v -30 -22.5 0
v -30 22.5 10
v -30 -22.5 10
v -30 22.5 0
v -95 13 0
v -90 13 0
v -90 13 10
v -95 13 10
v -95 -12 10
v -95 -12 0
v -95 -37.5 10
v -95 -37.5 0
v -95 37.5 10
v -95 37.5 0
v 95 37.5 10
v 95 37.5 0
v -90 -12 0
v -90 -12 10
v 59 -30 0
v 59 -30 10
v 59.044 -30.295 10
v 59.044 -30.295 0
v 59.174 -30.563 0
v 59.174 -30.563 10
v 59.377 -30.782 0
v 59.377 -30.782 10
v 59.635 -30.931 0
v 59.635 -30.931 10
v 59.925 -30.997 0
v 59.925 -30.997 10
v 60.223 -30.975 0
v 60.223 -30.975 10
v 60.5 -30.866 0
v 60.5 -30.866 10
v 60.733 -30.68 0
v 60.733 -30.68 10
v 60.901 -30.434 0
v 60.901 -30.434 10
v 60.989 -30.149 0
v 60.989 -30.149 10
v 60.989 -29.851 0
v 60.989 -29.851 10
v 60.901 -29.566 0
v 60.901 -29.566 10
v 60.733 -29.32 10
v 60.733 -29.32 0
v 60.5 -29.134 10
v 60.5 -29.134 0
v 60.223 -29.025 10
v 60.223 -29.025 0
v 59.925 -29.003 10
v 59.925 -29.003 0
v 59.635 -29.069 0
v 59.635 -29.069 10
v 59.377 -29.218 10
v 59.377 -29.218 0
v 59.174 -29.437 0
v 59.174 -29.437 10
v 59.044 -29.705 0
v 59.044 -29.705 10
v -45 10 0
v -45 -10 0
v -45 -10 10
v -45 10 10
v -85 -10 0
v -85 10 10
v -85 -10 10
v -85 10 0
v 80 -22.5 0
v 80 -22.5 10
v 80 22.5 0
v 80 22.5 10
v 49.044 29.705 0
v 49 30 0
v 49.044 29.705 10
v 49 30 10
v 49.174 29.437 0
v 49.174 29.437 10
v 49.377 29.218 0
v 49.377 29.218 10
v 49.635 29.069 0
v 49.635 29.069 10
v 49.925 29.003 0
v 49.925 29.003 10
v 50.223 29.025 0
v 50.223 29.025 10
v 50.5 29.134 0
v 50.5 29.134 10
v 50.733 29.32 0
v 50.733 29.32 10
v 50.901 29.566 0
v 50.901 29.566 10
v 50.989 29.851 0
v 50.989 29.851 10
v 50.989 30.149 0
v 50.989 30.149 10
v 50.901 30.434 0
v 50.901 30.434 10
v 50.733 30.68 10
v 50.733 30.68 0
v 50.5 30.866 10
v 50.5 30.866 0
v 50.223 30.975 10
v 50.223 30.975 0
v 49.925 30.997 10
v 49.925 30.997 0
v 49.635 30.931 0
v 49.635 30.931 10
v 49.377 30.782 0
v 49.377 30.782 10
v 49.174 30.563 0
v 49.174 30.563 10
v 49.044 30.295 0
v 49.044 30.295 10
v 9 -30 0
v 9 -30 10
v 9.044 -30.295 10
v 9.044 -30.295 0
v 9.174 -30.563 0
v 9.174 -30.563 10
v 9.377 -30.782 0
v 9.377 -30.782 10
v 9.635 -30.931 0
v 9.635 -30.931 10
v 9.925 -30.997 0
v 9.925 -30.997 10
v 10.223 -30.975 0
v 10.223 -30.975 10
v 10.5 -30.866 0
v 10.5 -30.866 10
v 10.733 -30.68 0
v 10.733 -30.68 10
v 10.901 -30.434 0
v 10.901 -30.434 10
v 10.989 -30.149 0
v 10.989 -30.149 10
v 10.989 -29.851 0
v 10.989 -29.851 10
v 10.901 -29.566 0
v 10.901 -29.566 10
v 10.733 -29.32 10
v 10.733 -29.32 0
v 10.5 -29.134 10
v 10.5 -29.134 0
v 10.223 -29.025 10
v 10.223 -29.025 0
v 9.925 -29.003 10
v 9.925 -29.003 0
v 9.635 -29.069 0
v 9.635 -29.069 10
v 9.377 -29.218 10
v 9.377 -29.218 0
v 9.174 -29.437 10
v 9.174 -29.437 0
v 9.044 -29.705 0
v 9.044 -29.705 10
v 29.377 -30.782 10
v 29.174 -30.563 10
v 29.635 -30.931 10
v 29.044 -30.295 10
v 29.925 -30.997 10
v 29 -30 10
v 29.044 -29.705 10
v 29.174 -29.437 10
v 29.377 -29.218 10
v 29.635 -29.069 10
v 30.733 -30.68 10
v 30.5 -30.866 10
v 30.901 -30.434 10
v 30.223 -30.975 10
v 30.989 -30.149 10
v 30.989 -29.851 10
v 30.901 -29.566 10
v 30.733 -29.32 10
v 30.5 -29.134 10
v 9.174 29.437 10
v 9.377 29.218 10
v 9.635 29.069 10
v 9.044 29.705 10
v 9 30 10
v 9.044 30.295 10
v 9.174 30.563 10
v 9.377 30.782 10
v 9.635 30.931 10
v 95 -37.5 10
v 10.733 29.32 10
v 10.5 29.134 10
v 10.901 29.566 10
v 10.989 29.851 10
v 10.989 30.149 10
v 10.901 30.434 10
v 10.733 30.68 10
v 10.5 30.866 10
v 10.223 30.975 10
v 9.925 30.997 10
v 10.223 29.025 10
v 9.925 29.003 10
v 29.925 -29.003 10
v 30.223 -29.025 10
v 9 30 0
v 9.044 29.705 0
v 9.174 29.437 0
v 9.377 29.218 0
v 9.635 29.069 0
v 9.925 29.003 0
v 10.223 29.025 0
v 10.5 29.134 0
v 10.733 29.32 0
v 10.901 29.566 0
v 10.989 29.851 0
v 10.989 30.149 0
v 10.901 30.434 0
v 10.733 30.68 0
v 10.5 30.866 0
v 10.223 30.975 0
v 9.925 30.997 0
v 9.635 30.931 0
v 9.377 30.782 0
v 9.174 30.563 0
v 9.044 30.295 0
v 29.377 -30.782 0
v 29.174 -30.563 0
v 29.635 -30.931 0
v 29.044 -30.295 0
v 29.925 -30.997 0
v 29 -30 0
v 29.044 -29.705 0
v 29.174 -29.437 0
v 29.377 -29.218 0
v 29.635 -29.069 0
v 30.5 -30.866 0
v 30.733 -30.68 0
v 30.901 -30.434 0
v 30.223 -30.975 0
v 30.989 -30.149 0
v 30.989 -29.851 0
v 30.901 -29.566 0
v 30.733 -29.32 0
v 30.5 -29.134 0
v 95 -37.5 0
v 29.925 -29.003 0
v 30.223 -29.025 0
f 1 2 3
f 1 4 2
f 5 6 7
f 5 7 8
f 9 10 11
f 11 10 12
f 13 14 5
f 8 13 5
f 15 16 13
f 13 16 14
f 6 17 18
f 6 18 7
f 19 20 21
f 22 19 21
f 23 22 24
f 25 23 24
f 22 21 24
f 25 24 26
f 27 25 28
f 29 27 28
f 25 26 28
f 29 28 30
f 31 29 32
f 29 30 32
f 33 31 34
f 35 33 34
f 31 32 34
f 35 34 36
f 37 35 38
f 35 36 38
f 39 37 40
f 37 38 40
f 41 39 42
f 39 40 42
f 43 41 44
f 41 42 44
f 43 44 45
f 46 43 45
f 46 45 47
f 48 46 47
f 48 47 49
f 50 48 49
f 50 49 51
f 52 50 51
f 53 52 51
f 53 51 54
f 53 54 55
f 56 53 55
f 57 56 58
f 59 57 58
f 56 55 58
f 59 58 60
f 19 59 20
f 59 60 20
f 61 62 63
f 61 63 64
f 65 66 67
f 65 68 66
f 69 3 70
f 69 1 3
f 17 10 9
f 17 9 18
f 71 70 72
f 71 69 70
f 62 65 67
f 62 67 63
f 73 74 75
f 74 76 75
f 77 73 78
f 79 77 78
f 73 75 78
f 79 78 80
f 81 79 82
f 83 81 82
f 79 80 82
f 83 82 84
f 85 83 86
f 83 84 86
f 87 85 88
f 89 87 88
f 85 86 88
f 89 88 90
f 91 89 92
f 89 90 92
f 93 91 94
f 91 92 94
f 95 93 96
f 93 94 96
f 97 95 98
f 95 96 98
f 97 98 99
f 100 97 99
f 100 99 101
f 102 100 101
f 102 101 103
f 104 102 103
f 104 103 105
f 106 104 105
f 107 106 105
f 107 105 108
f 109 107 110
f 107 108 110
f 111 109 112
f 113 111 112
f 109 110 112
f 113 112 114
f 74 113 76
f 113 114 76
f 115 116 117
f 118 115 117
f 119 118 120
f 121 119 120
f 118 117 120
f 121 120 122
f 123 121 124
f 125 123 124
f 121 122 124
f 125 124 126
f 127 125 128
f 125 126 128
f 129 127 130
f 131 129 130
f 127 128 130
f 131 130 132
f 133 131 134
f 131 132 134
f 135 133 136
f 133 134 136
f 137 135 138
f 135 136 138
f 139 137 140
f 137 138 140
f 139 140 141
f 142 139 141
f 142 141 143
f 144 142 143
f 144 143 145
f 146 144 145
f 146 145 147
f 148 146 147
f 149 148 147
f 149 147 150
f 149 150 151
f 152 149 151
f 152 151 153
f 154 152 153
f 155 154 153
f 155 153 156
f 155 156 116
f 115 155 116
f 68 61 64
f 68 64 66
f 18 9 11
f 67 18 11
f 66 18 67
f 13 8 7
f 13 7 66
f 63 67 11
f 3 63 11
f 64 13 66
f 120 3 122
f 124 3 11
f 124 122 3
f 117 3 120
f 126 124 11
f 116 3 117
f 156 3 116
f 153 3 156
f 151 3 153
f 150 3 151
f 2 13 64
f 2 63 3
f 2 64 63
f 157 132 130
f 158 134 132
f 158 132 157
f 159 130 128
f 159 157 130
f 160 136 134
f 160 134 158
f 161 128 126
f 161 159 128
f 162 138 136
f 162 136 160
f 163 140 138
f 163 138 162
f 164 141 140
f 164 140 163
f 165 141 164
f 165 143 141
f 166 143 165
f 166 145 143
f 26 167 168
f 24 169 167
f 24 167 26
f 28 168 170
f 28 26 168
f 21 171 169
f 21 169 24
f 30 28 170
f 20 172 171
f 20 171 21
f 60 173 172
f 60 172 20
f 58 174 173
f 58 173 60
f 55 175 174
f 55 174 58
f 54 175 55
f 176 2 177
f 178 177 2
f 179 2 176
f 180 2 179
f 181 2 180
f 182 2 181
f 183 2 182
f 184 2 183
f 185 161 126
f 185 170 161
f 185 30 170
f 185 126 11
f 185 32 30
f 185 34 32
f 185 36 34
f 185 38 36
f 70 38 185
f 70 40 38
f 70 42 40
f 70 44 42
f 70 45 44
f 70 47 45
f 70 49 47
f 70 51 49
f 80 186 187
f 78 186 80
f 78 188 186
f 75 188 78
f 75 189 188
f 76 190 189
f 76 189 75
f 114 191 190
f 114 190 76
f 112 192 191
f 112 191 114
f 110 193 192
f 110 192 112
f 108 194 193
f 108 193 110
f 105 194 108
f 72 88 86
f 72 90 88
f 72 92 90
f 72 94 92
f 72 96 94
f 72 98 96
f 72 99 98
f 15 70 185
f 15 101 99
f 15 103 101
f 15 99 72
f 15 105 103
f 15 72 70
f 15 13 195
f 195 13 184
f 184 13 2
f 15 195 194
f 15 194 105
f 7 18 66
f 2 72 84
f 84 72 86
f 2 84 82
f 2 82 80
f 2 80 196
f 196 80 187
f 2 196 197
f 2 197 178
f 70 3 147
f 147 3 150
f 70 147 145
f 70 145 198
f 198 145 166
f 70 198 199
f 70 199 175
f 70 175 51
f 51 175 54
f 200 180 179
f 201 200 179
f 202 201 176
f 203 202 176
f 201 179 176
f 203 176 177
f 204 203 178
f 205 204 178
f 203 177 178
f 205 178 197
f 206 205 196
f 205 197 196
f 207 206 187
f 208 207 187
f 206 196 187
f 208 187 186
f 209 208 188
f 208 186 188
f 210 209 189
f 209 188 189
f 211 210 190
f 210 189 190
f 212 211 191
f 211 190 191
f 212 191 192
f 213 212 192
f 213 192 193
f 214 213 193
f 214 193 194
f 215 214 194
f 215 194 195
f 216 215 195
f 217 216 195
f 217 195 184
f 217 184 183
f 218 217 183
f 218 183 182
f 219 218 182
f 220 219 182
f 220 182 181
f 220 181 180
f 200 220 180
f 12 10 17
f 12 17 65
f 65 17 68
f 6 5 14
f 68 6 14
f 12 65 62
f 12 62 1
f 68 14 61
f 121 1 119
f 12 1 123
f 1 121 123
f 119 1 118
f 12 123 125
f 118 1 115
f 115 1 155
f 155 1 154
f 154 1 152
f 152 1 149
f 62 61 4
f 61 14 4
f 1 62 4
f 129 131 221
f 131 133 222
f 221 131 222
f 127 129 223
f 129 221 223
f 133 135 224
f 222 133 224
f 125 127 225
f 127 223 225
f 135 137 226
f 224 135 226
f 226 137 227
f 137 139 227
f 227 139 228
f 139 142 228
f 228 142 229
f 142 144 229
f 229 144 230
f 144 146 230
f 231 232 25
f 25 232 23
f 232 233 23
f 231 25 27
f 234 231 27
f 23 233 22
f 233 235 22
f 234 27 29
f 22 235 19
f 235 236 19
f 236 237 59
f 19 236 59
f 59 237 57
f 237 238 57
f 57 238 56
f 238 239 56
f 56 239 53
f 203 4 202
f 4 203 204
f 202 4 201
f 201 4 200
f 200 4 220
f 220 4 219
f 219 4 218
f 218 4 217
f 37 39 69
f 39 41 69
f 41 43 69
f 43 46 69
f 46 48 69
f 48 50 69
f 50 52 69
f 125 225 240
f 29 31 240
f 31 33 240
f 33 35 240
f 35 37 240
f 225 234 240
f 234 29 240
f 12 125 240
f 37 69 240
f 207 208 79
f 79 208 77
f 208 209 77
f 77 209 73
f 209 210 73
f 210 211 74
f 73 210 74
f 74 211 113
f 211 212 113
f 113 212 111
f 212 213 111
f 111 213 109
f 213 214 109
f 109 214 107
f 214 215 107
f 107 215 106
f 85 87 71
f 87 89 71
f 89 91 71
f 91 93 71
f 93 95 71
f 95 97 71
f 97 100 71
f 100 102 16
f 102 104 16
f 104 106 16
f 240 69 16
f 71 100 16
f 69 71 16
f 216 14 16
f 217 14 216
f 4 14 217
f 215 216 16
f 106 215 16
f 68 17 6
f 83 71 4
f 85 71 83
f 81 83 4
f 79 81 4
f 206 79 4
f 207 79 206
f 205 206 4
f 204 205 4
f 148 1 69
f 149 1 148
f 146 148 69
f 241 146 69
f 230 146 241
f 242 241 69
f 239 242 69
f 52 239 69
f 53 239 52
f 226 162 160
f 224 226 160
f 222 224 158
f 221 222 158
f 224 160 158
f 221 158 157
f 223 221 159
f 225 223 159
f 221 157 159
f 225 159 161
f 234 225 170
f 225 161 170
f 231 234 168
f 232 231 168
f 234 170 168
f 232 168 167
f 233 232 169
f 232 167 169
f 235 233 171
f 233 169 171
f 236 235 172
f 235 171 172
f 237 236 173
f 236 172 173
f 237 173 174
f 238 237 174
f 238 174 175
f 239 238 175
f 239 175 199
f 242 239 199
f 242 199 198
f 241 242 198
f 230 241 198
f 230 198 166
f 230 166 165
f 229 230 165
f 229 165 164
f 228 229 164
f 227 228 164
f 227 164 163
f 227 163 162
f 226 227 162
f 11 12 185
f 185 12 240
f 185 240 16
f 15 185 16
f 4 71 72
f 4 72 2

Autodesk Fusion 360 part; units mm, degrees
sketch "Sketch1" plane through (0, 0, 0) normal (0, 0, 1) x (1, 0, 0)
  line L0 (95, 37.5) -> (-95, 37.5)
  line L1 (-95, 37.5) -> (-95, -37.5)
  line L2 (-95, -37.5) -> (95, -37.5)
  line L3 (95, -37.5) -> (95, 37.5)
  line L4 (95, 37.5) -> (-95, -37.5) construction
  line L5 (-95, 37.5) -> (95, -37.5) construction
  line L6 (-45, 10) -> (-85, 10)
  line L7 (-85, 10) -> (-85, -10)
  line L8 (-85, -10) -> (-45, -10)
  line L9 (-45, -10) -> (-45, 10)
  line L10 (-45, 10) -> (-85, -10) construction
  line L11 (-85, 10) -> (-45, -10) construction
  line L12 (80, 22.5) -> (-30, 22.5)
  line L13 (-30, 22.5) -> (-30, -22.5)
  line L14 (-30, -22.5) -> (80, -22.5)
  line L15 (80, -22.5) -> (80, 22.5)
  line L16 (80, 22.5) -> (-30, -22.5) construction
  line L17 (-30, 22.5) -> (80, -22.5) construction
  line L18 (-90, 13) -> (-106.6701, 13)
  line L19 (-106.6701, 13) -> (-106.6701, -12)
  line L20 (-106.6701, -12) -> (-90, -12)
  line L21 (-90, -12) -> (-90, 13)
  point P0 (-65, 0)
  point P1 (25, 0)
  dimension "d1" = 190
  dimension "d2" = 75
  dimension "d3" = 40
  dimension "d4" = 20
  dimension "d5" = 110
  dimension "d6" = 45
  dimension "d16" = 25
extrude "Extrude1" add sketch "Sketch1" along normal blind 10 contours L0 L1 L2 L3 L18 L20 L21 | L1 L18 L20 L21
sketch "Sketch2" plane through (0, 0, 10) normal (0, 0, 1) x (-1, 0, 0)
  line L0 (-80, -22.5) -> (-80, 22.5)
  line L1 (-80, 22.5) -> (30, 22.5)
  line L2 (30, 22.5) -> (30, -22.5)
  line L3 (30, -22.5) -> (-80, -22.5)
  line L4 (45, -10) -> (45, 10)
  line L5 (45, 10) -> (85, 10)
  line L6 (85, 10) -> (85, -10)
  line L7 (85, -10) -> (45, -10)
  line L8 (-95, 37.5) -> (-95, -37.5)
  line L9 (-95, -37.5) -> (95, -37.5)
  line L10 (95, -37.5) -> (95, 37.5)
  line L11 (95, 37.5) -> (-95, 37.5)
  circle A0 centre (-10, -30) radius 1
  circle A1 centre (-50, -30) radius 1
  circle A2 centre (-10, 30) radius 1
  circle A3 centre (-30, 30) radius 1
  circle A4 centre (-60, 30) radius 1
  dimension "d9" = 2
  dimension "d10" = 2
  dimension "d11" = 2
  dimension "d12" = 2
  dimension "d13" = 2
extrude "Extrude2" cut sketch "Sketch2" against normal blind 30 contours A0 | A1 | A2 | A3 | A4
extrude "Extrude3" cut sketch "Sketch1" along normal blind 40 contours L1 L18 L20 L21 | L1 L18 L19 L20
